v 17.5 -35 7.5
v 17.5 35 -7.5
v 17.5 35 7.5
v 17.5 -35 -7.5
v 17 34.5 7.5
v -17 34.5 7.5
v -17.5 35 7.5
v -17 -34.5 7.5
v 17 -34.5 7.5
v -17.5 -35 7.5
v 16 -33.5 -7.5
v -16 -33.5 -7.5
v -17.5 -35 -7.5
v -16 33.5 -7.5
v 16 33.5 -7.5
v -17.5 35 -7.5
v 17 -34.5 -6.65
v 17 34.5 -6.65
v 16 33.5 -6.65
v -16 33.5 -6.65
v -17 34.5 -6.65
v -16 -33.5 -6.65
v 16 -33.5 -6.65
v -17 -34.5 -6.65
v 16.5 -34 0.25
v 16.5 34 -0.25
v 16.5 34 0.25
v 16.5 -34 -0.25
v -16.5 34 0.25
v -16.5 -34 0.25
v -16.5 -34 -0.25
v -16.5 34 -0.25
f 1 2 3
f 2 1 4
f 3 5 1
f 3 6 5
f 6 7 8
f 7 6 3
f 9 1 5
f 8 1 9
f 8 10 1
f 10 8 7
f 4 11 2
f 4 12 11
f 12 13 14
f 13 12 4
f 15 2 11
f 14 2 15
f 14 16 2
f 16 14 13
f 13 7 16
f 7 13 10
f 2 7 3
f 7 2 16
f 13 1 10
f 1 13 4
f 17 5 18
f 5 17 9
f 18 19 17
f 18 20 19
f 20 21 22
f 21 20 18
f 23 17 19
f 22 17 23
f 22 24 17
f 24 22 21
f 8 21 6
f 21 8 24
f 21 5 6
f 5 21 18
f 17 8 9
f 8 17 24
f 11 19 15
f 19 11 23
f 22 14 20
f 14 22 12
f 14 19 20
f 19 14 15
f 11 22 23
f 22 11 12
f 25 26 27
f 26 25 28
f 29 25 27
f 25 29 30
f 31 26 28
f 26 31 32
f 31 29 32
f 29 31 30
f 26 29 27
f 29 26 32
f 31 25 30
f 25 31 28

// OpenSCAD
difference(){
cube([35,70,15], center=true);
    translate([0,0,0.6])
    cube([34,69,14.5],center=true);
    translate([0,0,-1])
    cube([32,67,16],center=true);
}

color("green",1.0)
//translate([0, 0, 50])
translate ([0, 0, 10*sin($t*360)])
    cube([33,68,0.5], center=true);
